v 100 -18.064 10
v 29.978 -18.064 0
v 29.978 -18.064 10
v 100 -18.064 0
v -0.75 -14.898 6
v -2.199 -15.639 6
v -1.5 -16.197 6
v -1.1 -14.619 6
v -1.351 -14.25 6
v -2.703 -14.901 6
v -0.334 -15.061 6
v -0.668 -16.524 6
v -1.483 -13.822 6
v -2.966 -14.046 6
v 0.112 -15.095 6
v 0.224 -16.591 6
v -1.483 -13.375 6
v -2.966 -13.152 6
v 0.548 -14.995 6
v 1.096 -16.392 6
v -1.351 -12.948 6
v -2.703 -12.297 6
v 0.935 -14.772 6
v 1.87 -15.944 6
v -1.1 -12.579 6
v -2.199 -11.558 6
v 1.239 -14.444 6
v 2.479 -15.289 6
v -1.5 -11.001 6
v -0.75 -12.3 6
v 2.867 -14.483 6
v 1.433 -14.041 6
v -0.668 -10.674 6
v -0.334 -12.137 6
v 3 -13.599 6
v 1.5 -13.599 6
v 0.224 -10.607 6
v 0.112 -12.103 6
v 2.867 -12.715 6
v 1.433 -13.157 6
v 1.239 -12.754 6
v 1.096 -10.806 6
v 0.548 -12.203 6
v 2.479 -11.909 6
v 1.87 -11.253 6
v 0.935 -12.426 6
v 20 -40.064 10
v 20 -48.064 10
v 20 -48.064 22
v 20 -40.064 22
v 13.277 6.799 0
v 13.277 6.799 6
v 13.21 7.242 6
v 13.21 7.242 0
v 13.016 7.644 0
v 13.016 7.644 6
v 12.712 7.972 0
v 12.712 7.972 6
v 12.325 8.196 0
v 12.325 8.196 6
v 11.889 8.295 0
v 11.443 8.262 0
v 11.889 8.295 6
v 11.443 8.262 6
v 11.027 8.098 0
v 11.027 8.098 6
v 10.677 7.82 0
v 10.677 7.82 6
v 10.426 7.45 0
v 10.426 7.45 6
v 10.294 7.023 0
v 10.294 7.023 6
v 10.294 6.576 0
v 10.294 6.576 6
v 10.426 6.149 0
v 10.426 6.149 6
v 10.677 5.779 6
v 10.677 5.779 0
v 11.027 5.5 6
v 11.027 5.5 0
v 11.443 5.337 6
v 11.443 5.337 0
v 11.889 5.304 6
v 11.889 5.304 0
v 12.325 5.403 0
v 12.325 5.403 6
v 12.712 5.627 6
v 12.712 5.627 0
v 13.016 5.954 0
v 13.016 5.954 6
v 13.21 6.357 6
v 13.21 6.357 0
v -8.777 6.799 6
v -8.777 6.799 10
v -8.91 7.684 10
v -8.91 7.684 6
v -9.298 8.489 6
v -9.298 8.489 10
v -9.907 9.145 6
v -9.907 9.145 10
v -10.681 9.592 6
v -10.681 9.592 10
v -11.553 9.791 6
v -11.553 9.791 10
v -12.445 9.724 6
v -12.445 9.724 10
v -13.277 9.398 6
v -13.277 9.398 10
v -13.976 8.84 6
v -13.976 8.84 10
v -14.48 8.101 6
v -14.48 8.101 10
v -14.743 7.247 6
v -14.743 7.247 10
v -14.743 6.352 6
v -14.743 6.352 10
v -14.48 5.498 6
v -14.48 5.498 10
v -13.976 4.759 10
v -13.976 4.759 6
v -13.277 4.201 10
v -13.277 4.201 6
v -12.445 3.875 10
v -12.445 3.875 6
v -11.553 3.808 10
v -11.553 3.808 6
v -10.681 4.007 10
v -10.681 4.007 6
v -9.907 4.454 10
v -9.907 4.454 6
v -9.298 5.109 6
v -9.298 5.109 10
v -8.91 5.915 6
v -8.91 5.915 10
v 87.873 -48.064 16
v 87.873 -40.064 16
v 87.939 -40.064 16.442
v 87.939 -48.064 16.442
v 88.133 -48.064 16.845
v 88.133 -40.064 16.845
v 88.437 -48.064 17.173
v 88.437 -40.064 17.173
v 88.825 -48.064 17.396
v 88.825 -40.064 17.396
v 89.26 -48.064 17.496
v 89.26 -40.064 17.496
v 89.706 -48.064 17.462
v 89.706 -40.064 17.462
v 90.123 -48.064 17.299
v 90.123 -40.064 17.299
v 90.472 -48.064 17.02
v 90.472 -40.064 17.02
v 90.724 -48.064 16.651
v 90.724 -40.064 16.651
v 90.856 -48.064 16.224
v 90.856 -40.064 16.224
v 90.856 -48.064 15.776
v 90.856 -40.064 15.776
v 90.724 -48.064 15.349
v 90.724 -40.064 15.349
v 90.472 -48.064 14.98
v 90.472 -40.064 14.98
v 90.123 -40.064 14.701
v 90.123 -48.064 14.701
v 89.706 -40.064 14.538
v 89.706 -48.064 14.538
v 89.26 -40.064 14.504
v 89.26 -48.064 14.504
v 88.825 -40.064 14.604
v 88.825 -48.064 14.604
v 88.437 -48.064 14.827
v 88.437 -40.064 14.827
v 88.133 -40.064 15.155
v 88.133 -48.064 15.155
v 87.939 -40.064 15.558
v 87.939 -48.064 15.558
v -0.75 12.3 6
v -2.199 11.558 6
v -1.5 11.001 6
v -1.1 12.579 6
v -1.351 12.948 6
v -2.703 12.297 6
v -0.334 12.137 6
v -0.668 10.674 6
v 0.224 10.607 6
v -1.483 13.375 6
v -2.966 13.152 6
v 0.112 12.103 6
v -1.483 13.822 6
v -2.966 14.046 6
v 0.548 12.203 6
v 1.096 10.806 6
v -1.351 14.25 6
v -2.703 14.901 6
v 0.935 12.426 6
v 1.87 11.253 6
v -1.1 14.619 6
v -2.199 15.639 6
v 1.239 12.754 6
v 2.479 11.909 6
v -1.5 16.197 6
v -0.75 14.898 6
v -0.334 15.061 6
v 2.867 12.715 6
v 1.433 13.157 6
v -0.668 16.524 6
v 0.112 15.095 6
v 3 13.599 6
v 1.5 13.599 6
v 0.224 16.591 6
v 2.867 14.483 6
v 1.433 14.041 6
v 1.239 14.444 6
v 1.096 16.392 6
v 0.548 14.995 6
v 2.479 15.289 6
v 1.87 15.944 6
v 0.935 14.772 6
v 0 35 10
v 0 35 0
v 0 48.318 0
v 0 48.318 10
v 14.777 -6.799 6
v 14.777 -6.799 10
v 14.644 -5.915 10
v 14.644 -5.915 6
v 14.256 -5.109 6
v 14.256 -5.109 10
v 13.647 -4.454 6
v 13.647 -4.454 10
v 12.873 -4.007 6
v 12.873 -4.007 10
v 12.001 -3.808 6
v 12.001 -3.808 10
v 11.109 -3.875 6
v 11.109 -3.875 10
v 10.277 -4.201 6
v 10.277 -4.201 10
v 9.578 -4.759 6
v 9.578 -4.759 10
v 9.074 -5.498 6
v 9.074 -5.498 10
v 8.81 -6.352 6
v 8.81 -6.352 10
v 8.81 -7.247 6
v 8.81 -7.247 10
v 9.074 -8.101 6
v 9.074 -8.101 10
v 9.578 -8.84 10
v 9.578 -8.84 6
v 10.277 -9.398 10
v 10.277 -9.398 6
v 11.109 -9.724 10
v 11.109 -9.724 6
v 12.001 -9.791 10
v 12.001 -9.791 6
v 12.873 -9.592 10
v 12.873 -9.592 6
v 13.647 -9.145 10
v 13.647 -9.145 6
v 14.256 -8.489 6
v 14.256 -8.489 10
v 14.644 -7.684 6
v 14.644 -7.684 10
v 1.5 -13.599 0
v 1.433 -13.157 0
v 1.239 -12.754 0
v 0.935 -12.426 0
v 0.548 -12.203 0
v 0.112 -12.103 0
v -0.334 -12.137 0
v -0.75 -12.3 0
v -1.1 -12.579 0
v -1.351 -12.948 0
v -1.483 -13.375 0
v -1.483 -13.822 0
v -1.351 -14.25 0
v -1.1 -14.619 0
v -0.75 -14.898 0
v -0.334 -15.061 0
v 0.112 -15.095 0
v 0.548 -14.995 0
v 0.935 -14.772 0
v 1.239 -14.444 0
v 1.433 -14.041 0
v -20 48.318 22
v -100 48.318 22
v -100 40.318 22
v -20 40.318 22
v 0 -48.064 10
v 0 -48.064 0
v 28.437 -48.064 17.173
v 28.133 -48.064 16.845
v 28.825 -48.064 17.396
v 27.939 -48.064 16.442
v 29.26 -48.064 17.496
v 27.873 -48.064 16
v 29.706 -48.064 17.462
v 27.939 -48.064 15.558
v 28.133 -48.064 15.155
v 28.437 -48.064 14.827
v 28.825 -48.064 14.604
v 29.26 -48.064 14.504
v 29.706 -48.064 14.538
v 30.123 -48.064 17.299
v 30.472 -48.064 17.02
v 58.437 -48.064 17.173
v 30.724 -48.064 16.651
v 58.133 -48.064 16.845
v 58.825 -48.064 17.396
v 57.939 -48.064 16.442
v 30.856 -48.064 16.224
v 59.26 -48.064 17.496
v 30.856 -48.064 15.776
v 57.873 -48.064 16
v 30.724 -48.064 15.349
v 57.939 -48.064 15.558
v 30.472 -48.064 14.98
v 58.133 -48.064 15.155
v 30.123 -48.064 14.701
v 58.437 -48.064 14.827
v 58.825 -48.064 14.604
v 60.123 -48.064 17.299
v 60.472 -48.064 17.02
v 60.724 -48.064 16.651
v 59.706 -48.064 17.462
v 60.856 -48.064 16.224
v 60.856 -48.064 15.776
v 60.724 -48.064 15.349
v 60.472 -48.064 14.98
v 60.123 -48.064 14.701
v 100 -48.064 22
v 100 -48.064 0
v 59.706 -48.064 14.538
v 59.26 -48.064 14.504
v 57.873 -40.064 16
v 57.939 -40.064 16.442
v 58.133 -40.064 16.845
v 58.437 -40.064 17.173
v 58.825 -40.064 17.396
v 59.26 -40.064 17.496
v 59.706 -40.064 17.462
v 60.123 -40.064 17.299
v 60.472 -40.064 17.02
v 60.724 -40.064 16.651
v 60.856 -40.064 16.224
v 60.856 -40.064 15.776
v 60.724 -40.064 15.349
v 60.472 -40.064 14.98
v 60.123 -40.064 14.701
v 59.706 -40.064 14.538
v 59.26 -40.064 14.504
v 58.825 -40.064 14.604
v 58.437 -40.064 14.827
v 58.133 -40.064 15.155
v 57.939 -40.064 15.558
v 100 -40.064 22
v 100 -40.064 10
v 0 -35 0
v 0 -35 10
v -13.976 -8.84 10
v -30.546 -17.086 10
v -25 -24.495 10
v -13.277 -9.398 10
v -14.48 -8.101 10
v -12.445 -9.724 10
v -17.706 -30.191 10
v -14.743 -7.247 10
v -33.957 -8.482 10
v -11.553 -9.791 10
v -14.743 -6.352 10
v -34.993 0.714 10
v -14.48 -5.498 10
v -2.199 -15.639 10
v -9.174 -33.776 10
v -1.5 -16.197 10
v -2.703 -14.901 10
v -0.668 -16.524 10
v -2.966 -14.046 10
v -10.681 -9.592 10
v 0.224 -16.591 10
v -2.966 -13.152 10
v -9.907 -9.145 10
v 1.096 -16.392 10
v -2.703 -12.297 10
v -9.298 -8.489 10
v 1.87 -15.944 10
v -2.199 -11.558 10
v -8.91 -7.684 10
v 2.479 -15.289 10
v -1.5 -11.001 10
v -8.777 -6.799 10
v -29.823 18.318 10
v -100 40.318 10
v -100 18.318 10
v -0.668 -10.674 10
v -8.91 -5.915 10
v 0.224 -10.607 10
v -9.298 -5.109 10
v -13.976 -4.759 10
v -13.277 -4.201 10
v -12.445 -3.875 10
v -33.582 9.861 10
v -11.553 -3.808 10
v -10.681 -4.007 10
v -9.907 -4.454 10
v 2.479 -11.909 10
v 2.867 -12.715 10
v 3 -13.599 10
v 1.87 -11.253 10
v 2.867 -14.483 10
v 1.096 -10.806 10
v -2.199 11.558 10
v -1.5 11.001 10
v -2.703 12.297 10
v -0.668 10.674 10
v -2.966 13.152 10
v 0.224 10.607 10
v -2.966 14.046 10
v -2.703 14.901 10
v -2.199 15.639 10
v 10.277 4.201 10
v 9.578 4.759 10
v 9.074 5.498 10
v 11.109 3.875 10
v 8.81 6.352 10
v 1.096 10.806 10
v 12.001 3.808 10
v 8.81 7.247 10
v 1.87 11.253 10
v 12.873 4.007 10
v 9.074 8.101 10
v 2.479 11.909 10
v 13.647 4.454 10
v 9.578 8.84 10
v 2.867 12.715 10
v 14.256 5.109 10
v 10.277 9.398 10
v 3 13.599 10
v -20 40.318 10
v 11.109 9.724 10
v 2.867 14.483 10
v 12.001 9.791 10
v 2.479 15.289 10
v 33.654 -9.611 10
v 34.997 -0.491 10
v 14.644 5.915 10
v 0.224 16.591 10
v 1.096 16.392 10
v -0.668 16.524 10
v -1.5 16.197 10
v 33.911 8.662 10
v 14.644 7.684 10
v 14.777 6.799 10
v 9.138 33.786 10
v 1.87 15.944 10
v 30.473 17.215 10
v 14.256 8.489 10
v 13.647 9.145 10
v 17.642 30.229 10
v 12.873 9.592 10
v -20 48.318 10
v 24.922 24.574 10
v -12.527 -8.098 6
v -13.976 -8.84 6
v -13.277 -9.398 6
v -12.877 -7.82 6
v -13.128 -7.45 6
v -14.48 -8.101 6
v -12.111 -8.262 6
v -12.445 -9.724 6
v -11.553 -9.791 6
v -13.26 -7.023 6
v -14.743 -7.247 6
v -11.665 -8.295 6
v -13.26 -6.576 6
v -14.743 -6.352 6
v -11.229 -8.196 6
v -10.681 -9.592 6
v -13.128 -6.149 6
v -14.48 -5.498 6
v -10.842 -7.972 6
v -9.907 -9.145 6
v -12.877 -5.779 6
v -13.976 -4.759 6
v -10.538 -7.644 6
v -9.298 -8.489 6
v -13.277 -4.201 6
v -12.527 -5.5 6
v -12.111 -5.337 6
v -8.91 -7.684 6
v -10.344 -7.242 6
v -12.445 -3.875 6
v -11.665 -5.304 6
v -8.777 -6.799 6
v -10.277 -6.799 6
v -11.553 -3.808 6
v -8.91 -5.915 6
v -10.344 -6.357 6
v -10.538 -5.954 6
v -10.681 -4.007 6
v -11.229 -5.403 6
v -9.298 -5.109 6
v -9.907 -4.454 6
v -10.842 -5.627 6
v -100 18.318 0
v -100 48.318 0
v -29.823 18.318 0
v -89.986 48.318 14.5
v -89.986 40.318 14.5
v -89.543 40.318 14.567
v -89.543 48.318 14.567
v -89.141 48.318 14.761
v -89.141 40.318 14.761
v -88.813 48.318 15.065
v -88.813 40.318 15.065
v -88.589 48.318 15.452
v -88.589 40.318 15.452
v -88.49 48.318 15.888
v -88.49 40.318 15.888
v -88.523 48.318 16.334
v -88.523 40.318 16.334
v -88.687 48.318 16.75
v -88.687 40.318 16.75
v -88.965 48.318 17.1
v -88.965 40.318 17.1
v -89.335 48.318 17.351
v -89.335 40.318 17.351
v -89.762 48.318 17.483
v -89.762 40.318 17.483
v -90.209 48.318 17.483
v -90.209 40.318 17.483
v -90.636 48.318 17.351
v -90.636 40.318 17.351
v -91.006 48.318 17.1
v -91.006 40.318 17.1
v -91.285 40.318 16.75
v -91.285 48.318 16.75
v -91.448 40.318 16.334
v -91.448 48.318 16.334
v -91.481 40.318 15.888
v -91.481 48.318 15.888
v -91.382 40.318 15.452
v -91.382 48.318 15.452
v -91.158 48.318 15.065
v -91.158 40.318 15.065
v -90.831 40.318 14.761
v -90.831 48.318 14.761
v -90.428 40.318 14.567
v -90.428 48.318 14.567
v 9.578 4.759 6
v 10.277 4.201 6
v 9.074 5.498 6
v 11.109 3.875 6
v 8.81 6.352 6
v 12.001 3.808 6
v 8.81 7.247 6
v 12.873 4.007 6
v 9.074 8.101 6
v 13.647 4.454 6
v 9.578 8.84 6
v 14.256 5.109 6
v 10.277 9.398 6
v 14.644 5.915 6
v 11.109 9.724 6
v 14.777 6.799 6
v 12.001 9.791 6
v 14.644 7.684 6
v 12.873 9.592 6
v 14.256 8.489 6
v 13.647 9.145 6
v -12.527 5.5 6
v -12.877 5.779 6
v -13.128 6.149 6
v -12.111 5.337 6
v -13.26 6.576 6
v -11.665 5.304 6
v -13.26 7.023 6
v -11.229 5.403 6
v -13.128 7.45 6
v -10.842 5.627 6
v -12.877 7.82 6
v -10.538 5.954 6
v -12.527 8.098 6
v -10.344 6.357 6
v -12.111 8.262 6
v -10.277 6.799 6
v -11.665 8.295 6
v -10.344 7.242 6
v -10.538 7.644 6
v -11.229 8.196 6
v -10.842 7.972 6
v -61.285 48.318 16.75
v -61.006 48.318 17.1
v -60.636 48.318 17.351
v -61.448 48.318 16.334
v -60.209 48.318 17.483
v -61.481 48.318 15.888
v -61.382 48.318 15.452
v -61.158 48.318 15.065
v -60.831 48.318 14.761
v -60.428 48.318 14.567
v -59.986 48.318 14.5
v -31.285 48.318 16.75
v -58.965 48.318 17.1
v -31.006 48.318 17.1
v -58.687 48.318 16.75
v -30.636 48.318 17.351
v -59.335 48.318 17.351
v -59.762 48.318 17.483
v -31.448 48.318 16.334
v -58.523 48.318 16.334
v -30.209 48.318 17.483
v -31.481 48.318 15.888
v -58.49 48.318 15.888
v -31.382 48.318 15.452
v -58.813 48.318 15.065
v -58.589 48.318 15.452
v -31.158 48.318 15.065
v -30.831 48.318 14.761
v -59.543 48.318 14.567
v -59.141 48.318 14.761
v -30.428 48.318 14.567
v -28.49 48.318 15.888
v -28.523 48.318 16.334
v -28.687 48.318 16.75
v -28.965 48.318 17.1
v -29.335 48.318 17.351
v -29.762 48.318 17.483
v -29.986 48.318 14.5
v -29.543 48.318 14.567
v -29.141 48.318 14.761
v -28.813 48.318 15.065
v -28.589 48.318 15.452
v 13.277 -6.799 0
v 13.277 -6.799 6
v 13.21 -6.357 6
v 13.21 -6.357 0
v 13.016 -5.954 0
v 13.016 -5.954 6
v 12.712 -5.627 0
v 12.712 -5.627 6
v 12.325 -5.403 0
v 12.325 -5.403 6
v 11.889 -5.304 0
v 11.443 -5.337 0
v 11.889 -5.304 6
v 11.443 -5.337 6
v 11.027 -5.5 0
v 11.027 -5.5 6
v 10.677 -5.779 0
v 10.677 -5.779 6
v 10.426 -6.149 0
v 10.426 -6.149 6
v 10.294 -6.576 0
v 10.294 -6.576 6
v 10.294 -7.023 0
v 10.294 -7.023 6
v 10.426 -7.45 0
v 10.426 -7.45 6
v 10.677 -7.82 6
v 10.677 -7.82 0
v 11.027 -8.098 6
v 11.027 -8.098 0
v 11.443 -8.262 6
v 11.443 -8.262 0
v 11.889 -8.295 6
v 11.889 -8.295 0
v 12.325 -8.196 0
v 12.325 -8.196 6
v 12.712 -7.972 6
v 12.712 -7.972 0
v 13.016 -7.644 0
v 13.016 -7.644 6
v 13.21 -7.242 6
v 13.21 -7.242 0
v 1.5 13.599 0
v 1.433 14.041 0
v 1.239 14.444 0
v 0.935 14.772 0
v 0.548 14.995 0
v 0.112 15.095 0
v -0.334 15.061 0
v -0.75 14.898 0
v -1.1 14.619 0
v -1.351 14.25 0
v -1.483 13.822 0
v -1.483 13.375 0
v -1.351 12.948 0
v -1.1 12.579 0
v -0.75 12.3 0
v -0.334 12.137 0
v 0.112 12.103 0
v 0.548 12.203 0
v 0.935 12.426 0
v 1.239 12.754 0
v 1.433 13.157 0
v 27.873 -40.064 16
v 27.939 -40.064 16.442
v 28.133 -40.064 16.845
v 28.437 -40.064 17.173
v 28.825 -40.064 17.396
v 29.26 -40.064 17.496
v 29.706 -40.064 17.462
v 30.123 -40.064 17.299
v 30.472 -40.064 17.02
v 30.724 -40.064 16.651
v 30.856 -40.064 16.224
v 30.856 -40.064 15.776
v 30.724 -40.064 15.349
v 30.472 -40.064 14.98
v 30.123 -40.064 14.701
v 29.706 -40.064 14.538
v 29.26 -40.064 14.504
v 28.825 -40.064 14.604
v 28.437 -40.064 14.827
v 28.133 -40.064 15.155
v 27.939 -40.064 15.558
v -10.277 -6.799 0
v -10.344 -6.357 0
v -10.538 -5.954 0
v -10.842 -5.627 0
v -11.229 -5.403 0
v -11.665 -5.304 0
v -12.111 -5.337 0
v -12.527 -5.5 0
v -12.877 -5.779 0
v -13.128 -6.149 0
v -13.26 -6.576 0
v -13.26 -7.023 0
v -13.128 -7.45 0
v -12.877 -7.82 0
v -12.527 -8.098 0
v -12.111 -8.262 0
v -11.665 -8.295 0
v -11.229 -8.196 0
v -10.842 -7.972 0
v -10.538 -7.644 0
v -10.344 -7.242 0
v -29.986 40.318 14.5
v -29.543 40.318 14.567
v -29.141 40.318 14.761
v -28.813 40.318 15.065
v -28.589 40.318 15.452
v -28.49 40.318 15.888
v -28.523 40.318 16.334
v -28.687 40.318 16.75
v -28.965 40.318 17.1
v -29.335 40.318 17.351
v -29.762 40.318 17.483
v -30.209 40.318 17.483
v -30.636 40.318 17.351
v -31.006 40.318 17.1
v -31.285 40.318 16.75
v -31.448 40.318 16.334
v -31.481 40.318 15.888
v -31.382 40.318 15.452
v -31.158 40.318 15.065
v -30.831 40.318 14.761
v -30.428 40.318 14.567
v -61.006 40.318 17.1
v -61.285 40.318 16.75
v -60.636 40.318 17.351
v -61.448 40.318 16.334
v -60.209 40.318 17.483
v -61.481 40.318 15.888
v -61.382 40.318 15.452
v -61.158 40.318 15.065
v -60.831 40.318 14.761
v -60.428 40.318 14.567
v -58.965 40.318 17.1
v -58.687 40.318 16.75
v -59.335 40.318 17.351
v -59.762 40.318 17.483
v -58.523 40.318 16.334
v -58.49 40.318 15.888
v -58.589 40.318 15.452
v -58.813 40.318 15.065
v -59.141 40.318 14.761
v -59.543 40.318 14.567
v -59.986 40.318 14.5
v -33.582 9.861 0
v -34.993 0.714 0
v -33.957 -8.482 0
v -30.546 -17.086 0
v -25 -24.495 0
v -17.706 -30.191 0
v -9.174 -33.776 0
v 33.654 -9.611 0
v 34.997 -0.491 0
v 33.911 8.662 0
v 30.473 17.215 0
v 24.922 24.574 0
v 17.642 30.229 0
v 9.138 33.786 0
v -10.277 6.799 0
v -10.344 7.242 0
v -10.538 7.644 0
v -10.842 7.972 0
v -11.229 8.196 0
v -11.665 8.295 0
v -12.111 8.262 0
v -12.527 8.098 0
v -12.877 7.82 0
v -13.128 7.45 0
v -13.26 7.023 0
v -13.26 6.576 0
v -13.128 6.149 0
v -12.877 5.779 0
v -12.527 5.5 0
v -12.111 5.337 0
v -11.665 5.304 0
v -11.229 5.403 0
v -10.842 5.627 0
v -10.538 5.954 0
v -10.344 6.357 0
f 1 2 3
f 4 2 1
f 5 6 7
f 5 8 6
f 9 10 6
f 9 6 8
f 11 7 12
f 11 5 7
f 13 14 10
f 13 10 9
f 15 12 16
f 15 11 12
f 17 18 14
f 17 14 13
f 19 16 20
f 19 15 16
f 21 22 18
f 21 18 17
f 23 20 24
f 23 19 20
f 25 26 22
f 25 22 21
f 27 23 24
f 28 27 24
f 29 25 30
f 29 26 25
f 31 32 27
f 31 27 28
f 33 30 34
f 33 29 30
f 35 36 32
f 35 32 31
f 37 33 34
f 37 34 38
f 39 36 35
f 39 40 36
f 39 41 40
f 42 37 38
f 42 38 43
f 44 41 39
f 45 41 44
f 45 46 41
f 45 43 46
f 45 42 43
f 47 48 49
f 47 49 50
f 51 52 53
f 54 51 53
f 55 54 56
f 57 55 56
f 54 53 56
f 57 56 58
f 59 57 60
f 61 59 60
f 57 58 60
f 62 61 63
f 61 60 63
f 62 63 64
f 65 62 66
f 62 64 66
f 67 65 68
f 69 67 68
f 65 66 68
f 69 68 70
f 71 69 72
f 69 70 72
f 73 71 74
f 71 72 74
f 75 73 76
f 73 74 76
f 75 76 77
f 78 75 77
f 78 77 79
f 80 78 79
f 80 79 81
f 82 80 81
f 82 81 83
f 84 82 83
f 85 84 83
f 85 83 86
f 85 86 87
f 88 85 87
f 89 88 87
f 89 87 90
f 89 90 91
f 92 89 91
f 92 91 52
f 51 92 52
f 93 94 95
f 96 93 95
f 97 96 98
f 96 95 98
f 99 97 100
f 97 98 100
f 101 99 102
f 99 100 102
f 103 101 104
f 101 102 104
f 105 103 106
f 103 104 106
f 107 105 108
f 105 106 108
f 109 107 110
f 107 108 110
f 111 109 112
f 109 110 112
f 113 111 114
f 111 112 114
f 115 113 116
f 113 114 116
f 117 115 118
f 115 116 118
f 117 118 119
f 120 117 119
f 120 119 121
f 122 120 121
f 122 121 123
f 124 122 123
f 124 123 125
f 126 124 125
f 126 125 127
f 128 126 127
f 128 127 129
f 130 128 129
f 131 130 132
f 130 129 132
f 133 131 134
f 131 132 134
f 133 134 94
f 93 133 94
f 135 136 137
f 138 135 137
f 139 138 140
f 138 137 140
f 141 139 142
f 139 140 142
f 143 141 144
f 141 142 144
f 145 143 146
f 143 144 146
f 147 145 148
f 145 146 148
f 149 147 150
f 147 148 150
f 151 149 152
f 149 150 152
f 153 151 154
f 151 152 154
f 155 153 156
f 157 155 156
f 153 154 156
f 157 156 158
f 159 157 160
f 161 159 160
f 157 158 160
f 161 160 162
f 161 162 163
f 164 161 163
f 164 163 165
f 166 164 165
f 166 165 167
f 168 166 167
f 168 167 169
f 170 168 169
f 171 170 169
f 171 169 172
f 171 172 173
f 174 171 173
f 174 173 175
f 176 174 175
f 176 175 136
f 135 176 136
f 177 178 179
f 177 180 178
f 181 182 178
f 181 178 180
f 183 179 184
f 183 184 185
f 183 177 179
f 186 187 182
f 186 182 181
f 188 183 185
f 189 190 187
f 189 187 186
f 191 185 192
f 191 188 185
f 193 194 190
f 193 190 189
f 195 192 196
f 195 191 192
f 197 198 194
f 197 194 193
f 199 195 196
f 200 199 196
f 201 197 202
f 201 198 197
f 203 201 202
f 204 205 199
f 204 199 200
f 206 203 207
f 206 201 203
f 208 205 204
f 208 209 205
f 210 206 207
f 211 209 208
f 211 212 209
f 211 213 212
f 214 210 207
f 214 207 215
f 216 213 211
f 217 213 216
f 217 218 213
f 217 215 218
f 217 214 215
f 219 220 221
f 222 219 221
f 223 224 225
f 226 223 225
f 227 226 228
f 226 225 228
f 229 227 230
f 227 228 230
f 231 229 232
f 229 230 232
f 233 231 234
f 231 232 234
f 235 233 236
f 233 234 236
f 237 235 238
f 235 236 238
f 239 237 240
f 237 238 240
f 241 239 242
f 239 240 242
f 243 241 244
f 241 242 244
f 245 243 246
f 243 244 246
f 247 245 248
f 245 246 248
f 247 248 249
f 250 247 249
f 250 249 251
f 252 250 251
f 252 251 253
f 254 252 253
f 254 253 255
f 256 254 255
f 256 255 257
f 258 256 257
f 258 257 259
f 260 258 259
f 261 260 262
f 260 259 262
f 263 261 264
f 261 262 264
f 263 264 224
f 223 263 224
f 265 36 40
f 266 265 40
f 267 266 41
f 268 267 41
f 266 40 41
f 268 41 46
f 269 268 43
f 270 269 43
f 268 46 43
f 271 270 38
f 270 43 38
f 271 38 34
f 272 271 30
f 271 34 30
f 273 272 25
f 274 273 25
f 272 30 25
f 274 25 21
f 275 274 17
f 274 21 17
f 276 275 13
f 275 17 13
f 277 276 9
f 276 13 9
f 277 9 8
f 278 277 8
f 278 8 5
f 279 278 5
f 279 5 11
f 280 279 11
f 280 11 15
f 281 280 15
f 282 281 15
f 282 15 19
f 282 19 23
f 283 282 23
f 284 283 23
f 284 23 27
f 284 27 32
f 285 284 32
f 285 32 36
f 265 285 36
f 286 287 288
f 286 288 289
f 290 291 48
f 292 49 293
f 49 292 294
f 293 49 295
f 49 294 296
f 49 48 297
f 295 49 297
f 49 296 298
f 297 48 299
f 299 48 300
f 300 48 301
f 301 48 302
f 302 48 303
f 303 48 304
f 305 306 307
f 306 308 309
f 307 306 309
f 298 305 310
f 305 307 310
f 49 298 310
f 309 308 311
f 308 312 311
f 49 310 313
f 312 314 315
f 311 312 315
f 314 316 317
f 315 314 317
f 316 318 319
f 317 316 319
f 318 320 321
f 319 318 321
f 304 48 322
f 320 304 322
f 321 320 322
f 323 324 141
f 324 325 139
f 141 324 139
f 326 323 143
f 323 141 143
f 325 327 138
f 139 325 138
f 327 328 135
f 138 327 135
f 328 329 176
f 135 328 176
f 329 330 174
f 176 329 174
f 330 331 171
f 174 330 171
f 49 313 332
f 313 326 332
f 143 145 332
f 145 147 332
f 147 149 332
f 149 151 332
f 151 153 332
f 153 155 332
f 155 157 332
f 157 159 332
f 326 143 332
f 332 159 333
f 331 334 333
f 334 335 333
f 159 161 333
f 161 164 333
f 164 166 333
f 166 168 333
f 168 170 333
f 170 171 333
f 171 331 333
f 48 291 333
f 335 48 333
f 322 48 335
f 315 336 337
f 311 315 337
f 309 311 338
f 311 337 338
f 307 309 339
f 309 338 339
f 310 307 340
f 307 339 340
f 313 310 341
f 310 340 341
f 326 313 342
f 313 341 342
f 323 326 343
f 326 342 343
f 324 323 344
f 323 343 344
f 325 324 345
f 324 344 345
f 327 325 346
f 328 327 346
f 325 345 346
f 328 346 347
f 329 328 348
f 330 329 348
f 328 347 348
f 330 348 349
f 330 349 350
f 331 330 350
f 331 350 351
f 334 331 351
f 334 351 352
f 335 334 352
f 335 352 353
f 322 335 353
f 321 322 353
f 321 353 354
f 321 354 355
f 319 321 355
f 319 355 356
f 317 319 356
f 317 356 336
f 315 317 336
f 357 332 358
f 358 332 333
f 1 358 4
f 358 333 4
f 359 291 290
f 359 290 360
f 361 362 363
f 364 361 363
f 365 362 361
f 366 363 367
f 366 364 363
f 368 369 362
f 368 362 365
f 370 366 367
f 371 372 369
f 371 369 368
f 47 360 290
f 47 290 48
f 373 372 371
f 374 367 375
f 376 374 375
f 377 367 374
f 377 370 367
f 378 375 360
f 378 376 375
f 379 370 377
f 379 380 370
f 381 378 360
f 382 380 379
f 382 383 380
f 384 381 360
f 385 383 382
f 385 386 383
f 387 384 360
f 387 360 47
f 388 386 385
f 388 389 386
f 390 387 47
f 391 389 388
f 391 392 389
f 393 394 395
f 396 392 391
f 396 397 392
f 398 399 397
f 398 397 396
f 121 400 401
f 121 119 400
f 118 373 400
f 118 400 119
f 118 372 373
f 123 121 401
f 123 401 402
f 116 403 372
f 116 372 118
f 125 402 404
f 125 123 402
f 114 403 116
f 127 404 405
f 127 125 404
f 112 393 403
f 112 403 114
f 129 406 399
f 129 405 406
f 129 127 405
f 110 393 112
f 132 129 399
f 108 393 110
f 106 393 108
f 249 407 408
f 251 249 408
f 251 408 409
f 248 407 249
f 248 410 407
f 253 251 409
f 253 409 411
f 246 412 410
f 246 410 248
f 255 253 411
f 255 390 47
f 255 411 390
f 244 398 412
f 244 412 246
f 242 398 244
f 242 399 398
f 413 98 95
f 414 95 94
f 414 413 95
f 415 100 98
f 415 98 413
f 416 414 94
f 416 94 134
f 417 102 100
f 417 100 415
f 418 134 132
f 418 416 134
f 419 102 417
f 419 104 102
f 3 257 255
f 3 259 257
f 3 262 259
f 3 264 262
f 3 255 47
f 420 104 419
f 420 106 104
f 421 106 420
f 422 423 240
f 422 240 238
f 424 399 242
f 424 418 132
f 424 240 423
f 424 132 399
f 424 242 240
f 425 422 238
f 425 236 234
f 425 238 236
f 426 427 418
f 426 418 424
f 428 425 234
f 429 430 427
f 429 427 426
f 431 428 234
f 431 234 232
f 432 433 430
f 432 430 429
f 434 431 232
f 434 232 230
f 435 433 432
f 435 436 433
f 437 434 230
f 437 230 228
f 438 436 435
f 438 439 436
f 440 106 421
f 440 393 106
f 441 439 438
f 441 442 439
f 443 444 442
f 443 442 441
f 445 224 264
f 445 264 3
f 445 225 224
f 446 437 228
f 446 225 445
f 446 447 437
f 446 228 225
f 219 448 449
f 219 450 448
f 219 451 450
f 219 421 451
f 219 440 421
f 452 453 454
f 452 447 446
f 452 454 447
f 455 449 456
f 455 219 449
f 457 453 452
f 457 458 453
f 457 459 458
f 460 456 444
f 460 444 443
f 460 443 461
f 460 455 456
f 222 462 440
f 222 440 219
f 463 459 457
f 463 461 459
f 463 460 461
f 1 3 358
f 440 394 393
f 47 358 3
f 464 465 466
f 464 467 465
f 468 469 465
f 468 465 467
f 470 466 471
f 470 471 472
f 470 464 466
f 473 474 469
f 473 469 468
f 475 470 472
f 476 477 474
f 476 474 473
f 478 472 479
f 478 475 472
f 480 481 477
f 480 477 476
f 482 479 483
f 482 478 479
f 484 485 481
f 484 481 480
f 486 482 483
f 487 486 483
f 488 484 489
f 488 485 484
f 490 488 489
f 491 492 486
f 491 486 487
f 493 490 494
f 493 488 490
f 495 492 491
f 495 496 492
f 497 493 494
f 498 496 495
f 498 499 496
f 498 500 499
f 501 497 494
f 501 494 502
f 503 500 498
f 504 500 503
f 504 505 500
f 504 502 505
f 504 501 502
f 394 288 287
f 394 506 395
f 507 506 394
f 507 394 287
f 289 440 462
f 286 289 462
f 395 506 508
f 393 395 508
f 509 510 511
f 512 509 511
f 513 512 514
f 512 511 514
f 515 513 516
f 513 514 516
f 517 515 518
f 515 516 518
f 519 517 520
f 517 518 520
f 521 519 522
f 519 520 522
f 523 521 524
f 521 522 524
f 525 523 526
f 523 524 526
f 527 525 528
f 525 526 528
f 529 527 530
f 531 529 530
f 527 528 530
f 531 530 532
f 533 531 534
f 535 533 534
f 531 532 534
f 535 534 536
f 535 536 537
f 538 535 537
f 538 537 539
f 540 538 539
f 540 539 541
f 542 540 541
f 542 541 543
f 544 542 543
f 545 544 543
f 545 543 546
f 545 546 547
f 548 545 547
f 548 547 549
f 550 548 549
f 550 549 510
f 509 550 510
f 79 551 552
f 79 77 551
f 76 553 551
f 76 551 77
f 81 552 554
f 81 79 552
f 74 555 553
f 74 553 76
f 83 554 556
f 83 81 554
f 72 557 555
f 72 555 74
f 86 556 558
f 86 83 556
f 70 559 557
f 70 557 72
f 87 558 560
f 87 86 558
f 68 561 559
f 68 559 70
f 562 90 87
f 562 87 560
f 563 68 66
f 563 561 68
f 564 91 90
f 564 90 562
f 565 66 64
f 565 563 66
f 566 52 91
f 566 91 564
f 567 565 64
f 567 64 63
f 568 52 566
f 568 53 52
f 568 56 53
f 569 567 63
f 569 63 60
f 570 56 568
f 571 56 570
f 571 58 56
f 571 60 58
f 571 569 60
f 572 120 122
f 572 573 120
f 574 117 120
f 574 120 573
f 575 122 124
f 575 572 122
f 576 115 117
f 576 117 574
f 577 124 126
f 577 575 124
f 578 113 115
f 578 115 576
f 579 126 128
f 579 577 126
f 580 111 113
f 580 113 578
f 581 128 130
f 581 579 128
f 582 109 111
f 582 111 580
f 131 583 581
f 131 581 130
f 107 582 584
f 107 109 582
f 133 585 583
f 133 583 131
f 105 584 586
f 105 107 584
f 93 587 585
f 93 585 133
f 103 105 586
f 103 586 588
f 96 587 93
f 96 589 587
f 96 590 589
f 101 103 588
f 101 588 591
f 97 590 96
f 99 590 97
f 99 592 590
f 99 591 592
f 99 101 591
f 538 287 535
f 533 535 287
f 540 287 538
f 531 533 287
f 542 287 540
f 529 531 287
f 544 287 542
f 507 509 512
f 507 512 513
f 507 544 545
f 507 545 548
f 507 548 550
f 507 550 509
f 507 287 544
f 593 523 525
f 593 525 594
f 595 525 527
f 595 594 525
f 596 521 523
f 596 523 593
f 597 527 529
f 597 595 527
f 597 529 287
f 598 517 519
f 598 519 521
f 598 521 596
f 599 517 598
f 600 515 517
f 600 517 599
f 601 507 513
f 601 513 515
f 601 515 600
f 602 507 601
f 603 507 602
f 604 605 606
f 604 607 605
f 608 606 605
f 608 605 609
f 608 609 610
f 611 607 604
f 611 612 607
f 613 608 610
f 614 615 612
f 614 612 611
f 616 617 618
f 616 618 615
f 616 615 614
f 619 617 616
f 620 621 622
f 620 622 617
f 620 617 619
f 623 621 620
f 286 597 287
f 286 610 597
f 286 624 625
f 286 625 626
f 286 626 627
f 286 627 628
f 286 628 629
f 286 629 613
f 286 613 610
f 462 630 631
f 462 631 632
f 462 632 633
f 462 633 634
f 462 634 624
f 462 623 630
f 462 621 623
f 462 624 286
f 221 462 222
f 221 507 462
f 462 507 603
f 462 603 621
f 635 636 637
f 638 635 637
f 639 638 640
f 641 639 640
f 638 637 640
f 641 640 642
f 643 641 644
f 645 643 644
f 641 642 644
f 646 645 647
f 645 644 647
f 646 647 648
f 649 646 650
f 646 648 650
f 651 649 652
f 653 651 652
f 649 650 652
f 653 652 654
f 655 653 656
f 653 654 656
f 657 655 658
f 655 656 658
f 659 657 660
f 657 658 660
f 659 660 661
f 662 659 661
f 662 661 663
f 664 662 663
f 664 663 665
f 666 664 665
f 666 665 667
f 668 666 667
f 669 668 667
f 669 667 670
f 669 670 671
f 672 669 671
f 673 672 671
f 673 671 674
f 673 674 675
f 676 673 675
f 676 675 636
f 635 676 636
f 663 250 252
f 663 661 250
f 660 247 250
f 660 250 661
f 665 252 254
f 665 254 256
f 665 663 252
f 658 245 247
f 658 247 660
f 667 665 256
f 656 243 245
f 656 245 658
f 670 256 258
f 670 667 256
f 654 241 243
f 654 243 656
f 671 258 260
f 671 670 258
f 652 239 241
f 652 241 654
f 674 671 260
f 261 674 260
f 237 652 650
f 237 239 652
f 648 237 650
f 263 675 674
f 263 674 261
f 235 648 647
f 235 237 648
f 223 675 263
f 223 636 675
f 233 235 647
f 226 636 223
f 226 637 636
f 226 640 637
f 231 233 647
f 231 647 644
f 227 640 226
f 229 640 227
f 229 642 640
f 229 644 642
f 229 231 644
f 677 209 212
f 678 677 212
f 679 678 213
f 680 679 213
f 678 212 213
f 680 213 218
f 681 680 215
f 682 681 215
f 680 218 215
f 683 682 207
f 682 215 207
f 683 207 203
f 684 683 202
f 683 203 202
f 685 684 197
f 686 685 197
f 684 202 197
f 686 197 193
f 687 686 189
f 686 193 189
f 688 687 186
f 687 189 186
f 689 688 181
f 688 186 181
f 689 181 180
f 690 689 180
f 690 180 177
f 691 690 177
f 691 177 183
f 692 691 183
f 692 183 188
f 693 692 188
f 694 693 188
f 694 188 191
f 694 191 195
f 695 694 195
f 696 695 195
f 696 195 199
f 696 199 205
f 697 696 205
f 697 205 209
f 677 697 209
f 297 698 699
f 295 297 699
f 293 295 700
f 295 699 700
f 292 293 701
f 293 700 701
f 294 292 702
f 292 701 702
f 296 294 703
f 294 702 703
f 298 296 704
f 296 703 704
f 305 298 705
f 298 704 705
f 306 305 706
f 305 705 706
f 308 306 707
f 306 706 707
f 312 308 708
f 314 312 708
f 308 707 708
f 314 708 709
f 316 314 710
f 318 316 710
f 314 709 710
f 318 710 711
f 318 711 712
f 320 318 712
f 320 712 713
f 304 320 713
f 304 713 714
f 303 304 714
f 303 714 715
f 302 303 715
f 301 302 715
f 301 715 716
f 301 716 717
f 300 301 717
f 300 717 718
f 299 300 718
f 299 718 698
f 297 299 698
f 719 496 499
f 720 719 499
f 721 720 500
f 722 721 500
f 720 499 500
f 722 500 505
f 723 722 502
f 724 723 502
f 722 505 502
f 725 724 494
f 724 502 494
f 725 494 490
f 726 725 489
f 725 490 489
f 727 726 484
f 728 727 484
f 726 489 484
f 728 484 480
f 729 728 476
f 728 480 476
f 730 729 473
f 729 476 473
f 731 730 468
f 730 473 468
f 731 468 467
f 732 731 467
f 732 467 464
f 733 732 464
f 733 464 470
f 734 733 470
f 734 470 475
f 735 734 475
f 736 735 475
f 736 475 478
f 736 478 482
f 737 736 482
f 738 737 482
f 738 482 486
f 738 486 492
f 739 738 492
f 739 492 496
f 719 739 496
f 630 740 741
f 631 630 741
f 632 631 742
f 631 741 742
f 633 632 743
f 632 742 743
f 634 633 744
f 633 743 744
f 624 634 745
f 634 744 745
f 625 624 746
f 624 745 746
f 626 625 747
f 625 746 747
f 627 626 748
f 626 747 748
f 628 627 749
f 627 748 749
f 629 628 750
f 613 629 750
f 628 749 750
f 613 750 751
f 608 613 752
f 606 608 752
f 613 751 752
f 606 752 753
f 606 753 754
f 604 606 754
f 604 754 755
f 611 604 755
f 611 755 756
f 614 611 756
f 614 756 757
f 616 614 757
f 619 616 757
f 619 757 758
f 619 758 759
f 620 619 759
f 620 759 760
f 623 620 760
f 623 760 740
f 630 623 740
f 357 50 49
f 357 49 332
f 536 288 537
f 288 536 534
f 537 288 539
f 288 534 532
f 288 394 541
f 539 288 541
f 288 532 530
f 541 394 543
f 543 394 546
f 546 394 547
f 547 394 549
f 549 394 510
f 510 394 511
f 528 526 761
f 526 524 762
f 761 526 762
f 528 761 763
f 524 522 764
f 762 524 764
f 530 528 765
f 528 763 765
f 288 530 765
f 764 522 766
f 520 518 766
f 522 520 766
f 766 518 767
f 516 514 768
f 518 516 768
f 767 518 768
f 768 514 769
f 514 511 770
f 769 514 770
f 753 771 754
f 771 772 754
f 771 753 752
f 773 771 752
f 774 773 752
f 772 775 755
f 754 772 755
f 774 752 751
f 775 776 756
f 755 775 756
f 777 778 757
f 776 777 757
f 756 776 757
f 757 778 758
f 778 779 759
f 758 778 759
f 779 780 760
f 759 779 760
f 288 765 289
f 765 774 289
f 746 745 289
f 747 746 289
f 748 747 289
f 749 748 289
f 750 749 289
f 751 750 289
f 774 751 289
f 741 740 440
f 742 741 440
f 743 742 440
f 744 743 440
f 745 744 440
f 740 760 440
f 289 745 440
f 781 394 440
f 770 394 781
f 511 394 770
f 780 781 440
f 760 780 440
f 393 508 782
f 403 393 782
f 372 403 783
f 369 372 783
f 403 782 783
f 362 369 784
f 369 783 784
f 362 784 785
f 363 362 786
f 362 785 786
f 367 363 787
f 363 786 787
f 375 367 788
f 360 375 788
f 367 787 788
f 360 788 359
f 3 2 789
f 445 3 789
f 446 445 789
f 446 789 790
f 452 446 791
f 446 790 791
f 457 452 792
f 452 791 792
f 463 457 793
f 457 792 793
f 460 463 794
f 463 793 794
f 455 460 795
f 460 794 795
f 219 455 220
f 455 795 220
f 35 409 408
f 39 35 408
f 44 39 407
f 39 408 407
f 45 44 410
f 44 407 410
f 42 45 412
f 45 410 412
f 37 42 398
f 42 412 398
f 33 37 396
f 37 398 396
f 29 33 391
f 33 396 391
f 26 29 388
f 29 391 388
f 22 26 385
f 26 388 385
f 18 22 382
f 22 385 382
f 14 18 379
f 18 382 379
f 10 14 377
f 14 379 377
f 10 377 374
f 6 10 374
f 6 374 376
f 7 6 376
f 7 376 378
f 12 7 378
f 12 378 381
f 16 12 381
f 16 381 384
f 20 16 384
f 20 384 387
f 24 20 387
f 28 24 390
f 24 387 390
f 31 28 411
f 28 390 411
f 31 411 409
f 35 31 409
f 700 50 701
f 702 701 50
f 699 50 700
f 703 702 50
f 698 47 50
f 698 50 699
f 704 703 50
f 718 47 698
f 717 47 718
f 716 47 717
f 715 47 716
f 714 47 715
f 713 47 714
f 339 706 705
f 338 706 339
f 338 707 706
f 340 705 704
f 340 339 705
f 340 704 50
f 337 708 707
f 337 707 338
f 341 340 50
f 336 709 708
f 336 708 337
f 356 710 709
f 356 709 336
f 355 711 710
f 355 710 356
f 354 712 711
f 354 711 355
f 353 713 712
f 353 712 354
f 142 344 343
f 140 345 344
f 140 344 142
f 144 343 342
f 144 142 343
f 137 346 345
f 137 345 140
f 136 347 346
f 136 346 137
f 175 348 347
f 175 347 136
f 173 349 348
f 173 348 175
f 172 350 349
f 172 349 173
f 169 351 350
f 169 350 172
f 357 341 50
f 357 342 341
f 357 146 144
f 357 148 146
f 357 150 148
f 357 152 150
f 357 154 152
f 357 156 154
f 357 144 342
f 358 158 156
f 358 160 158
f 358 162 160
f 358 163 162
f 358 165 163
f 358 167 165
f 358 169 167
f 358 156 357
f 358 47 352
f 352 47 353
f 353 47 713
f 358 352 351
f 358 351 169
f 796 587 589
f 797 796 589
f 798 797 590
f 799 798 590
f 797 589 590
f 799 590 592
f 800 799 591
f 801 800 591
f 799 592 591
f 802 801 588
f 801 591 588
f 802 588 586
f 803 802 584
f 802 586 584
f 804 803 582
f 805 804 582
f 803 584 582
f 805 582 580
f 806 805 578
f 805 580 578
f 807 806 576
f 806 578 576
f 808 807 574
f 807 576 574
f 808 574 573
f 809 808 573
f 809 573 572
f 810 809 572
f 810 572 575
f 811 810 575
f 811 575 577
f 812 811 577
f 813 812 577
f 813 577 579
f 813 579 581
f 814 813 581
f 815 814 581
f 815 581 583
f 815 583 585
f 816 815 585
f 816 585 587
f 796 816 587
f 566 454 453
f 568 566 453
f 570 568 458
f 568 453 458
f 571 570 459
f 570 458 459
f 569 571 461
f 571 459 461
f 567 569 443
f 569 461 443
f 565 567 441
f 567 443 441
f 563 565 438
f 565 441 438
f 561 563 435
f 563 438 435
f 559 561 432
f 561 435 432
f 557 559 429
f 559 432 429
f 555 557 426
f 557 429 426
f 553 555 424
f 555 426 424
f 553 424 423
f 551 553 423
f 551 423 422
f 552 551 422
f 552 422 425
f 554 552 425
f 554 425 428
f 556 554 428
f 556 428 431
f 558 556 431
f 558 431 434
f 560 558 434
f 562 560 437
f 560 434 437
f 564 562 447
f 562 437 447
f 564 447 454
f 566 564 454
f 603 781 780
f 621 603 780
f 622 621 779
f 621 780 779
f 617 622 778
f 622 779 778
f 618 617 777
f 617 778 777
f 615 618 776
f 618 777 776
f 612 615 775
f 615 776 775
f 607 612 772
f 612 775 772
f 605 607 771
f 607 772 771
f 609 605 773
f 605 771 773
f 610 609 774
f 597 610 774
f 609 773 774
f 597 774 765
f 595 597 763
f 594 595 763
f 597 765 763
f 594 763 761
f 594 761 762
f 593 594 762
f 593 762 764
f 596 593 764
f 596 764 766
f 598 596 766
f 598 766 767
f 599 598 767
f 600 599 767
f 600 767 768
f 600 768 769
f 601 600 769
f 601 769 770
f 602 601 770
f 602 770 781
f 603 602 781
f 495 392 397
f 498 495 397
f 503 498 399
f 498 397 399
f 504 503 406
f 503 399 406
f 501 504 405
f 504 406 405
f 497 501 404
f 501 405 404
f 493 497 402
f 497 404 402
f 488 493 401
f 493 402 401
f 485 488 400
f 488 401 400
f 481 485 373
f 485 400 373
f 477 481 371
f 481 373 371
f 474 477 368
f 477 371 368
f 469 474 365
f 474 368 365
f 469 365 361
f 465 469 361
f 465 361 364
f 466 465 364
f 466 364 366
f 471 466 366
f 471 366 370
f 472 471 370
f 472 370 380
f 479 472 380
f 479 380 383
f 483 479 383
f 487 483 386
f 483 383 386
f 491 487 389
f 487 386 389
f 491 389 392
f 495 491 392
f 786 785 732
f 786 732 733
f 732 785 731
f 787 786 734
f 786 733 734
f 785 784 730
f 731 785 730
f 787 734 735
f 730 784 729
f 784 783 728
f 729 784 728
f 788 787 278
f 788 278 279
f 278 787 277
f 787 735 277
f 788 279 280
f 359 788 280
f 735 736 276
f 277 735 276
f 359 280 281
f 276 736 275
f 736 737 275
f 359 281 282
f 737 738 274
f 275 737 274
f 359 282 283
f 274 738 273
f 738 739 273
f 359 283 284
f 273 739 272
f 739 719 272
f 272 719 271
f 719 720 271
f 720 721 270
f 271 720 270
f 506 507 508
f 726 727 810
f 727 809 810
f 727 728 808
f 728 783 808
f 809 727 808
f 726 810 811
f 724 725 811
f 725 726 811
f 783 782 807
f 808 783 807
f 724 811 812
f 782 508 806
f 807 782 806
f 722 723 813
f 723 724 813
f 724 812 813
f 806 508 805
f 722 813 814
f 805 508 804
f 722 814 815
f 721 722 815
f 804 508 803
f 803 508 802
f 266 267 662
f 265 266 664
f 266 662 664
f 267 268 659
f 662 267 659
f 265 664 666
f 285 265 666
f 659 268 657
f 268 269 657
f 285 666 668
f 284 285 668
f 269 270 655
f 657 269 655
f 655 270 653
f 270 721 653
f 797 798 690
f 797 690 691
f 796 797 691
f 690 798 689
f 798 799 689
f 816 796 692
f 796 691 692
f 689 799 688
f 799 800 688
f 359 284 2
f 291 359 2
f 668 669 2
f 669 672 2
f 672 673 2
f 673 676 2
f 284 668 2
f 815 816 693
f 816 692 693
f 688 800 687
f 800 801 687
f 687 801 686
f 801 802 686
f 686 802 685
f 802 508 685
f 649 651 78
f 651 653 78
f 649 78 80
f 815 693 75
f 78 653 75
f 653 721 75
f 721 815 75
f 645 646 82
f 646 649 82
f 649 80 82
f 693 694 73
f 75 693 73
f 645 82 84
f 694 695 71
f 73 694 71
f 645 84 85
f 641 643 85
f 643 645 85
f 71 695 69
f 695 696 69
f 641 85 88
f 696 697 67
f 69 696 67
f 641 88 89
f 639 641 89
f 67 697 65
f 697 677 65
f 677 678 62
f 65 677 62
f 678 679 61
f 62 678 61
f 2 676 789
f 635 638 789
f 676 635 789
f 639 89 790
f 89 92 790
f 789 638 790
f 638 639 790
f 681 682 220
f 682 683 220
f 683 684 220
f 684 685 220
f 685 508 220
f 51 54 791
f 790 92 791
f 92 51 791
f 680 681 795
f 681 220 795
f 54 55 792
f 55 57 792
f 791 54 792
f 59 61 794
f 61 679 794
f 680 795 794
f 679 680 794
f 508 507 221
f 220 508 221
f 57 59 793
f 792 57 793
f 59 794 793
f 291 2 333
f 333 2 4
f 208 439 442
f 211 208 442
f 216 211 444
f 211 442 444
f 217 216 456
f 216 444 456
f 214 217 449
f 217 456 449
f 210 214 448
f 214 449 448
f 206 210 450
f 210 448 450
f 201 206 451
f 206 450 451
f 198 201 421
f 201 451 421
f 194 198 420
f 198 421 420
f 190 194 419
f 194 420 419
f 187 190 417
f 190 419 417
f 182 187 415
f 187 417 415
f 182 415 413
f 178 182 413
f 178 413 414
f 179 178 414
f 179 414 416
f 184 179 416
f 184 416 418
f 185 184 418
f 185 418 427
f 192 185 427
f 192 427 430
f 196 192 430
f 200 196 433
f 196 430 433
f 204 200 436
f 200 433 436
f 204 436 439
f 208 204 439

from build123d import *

# Parameters (mm, degrees)
SKETCH1_R           = 35
SKETCH1_W           = 100
SKETCH1_H           = 30
BOSS_EXTRUDE2_DEPTH = 10
SKETCH2_R           = 3
SKETCH2_R_2         = 1.5
CUT_EXTRUDE2_DEPTH  = 4
SKETCH3_R           = 1.5
CUT_EXTRUDE3_DEPTH  = 112.510800428
SKETCH5_W           = 80
SKETCH5_H           = 8
BOSS_EXTRUDE3_DEPTH = 12
SKETCH6_R           = 1.5
CUT_EXTRUDE4_DEPTH  = 136.260863051
SKETCH7_R           = 1.5
CUT_EXTRUDE5_DEPTH  = 136.260863051


with BuildPart() as part:
    # Sketch1 → Boss-Extrude2 (new body)
    with BuildSketch(Plane.XY):
        Circle(SKETCH1_R)
        with Locations((50, -33.064391539)):
            Rectangle(SKETCH1_W, SKETCH1_H)
        with Locations((-50, 33.318305145)):
            Rectangle(SKETCH1_W, SKETCH1_H)
    extrude(amount=BOSS_EXTRUDE2_DEPTH)

    # Sketch2 → Cut-Extrude2 (cut)
    # profile 1 of 6: a face of its own
    with BuildSketch(Plane.XY.offset(10)):
        with Locations((0, -13.598895475)):
            Circle(SKETCH2_R)
        with Locations((0, -13.598895475)):
            Circle(SKETCH2_R_2, mode=Mode.SUBTRACT)
    # profile 2 of 6: a face of its own
    with BuildSketch(Plane.XY.offset(10)):
        with Locations((-11.776988944, -6.799447737)):
            Circle(SKETCH2_R)
        with Locations((-11.776988944, -6.799447737)):
            Circle(SKETCH2_R_2, mode=Mode.SUBTRACT)
    # profile 3 of 6: a face of its own
    with BuildSketch(Plane.XY.offset(10)):
        with Locations((-11.776988944, 6.799447737)):
            Circle(SKETCH2_R)
        with Locations((-11.776988944, 6.799447737)):
            Circle(SKETCH2_R_2, mode=Mode.SUBTRACT)
    # profile 4 of 6: a face of its own
    with BuildSketch(Plane.XY.offset(10)):
        with Locations((0, 13.598895475)):
            Circle(SKETCH2_R)
        with Locations((0, 13.598895475)):
            Circle(SKETCH2_R_2, mode=Mode.SUBTRACT)
    # profile 5 of 6: a face of its own
    with BuildSketch(Plane.XY.offset(10)):
        with Locations((11.776988944, 6.799447737)):
            Circle(SKETCH2_R)
        with Locations((11.776988944, 6.799447737)):
            Circle(SKETCH2_R_2, mode=Mode.SUBTRACT)
    # profile 6 of 6: a face of its own
    with BuildSketch(Plane.XY.offset(10)):
        with Locations((11.776988944, -6.799447737)):
            Circle(SKETCH2_R)
        with Locations((11.776988944, -6.799447737)):
            Circle(SKETCH2_R_2, mode=Mode.SUBTRACT)
    extrude(amount=-CUT_EXTRUDE2_DEPTH, mode=Mode.SUBTRACT)

    # Sketch3 → Cut-Extrude3 (cut, through all)
    with BuildSketch(Plane.XY.offset(10)):
        with Locations((0, -13.598895475)):
            Circle(SKETCH3_R)
        with Locations((-11.776988944, -6.799447737)):
            Circle(SKETCH3_R)
        with Locations((-11.776988944, 6.799447737)):
            Circle(SKETCH3_R)
        with Locations((0, 13.598895475)):
            Circle(SKETCH3_R)
        with Locations((11.776988944, 6.799447737)):
            Circle(SKETCH3_R)
        with Locations((11.776988944, -6.799447737)):
            Circle(SKETCH3_R)
    extrude(amount=-CUT_EXTRUDE3_DEPTH, mode=Mode.SUBTRACT)

    # Sketch5 → Boss-Extrude3 (add)
    with BuildSketch(Plane.XY.offset(10)):
        with Locations((-60, 44.318305145)):
            Rectangle(SKETCH5_W, SKETCH5_H)
        with Locations((60, -44.064391539)):
            Rectangle(SKETCH5_W, SKETCH5_H)
    extrude(amount=BOSS_EXTRUDE3_DEPTH)

    # Sketch6 → Cut-Extrude4 (cut, through all)
    with BuildSketch(Plane(origin=(0, 40.318305145, 0), x_dir=(-1, 0, 0), z_dir=(0, -1, 0))):
        with Locations(Location((89.985573023, -16, 0), (0, 0, 90))):
            Circle(SKETCH6_R)
        with Locations(Location((59.985573023, -16, 0), (0, 0, 90))):
            Circle(SKETCH6_R)
        with Locations(Location((29.985573023, -16, 0), (0, 0, 90))):
            Circle(SKETCH6_R)
    extrude(amount=-CUT_EXTRUDE4_DEPTH, mode=Mode.SUBTRACT)

    # Sketch7 → Cut-Extrude5 (cut, through all)
    with BuildSketch(Plane(origin=(0, -40.064391539, 0), x_dir=(1, 0, 0), z_dir=(0, 1, 0))):
        with Locations(Location((29.372536894, -16, 0), (0, 0, 180))):
            Circle(SKETCH7_R)
        with Locations(Location((59.372536894, -16, 0), (0, 0, 180))):
            Circle(SKETCH7_R)
        with Locations(Location((89.372536894, -16, 0), (0, 0, 180))):
            Circle(SKETCH7_R)
    extrude(amount=-CUT_EXTRUDE5_DEPTH, mode=Mode.SUBTRACT)


solid = part.part
